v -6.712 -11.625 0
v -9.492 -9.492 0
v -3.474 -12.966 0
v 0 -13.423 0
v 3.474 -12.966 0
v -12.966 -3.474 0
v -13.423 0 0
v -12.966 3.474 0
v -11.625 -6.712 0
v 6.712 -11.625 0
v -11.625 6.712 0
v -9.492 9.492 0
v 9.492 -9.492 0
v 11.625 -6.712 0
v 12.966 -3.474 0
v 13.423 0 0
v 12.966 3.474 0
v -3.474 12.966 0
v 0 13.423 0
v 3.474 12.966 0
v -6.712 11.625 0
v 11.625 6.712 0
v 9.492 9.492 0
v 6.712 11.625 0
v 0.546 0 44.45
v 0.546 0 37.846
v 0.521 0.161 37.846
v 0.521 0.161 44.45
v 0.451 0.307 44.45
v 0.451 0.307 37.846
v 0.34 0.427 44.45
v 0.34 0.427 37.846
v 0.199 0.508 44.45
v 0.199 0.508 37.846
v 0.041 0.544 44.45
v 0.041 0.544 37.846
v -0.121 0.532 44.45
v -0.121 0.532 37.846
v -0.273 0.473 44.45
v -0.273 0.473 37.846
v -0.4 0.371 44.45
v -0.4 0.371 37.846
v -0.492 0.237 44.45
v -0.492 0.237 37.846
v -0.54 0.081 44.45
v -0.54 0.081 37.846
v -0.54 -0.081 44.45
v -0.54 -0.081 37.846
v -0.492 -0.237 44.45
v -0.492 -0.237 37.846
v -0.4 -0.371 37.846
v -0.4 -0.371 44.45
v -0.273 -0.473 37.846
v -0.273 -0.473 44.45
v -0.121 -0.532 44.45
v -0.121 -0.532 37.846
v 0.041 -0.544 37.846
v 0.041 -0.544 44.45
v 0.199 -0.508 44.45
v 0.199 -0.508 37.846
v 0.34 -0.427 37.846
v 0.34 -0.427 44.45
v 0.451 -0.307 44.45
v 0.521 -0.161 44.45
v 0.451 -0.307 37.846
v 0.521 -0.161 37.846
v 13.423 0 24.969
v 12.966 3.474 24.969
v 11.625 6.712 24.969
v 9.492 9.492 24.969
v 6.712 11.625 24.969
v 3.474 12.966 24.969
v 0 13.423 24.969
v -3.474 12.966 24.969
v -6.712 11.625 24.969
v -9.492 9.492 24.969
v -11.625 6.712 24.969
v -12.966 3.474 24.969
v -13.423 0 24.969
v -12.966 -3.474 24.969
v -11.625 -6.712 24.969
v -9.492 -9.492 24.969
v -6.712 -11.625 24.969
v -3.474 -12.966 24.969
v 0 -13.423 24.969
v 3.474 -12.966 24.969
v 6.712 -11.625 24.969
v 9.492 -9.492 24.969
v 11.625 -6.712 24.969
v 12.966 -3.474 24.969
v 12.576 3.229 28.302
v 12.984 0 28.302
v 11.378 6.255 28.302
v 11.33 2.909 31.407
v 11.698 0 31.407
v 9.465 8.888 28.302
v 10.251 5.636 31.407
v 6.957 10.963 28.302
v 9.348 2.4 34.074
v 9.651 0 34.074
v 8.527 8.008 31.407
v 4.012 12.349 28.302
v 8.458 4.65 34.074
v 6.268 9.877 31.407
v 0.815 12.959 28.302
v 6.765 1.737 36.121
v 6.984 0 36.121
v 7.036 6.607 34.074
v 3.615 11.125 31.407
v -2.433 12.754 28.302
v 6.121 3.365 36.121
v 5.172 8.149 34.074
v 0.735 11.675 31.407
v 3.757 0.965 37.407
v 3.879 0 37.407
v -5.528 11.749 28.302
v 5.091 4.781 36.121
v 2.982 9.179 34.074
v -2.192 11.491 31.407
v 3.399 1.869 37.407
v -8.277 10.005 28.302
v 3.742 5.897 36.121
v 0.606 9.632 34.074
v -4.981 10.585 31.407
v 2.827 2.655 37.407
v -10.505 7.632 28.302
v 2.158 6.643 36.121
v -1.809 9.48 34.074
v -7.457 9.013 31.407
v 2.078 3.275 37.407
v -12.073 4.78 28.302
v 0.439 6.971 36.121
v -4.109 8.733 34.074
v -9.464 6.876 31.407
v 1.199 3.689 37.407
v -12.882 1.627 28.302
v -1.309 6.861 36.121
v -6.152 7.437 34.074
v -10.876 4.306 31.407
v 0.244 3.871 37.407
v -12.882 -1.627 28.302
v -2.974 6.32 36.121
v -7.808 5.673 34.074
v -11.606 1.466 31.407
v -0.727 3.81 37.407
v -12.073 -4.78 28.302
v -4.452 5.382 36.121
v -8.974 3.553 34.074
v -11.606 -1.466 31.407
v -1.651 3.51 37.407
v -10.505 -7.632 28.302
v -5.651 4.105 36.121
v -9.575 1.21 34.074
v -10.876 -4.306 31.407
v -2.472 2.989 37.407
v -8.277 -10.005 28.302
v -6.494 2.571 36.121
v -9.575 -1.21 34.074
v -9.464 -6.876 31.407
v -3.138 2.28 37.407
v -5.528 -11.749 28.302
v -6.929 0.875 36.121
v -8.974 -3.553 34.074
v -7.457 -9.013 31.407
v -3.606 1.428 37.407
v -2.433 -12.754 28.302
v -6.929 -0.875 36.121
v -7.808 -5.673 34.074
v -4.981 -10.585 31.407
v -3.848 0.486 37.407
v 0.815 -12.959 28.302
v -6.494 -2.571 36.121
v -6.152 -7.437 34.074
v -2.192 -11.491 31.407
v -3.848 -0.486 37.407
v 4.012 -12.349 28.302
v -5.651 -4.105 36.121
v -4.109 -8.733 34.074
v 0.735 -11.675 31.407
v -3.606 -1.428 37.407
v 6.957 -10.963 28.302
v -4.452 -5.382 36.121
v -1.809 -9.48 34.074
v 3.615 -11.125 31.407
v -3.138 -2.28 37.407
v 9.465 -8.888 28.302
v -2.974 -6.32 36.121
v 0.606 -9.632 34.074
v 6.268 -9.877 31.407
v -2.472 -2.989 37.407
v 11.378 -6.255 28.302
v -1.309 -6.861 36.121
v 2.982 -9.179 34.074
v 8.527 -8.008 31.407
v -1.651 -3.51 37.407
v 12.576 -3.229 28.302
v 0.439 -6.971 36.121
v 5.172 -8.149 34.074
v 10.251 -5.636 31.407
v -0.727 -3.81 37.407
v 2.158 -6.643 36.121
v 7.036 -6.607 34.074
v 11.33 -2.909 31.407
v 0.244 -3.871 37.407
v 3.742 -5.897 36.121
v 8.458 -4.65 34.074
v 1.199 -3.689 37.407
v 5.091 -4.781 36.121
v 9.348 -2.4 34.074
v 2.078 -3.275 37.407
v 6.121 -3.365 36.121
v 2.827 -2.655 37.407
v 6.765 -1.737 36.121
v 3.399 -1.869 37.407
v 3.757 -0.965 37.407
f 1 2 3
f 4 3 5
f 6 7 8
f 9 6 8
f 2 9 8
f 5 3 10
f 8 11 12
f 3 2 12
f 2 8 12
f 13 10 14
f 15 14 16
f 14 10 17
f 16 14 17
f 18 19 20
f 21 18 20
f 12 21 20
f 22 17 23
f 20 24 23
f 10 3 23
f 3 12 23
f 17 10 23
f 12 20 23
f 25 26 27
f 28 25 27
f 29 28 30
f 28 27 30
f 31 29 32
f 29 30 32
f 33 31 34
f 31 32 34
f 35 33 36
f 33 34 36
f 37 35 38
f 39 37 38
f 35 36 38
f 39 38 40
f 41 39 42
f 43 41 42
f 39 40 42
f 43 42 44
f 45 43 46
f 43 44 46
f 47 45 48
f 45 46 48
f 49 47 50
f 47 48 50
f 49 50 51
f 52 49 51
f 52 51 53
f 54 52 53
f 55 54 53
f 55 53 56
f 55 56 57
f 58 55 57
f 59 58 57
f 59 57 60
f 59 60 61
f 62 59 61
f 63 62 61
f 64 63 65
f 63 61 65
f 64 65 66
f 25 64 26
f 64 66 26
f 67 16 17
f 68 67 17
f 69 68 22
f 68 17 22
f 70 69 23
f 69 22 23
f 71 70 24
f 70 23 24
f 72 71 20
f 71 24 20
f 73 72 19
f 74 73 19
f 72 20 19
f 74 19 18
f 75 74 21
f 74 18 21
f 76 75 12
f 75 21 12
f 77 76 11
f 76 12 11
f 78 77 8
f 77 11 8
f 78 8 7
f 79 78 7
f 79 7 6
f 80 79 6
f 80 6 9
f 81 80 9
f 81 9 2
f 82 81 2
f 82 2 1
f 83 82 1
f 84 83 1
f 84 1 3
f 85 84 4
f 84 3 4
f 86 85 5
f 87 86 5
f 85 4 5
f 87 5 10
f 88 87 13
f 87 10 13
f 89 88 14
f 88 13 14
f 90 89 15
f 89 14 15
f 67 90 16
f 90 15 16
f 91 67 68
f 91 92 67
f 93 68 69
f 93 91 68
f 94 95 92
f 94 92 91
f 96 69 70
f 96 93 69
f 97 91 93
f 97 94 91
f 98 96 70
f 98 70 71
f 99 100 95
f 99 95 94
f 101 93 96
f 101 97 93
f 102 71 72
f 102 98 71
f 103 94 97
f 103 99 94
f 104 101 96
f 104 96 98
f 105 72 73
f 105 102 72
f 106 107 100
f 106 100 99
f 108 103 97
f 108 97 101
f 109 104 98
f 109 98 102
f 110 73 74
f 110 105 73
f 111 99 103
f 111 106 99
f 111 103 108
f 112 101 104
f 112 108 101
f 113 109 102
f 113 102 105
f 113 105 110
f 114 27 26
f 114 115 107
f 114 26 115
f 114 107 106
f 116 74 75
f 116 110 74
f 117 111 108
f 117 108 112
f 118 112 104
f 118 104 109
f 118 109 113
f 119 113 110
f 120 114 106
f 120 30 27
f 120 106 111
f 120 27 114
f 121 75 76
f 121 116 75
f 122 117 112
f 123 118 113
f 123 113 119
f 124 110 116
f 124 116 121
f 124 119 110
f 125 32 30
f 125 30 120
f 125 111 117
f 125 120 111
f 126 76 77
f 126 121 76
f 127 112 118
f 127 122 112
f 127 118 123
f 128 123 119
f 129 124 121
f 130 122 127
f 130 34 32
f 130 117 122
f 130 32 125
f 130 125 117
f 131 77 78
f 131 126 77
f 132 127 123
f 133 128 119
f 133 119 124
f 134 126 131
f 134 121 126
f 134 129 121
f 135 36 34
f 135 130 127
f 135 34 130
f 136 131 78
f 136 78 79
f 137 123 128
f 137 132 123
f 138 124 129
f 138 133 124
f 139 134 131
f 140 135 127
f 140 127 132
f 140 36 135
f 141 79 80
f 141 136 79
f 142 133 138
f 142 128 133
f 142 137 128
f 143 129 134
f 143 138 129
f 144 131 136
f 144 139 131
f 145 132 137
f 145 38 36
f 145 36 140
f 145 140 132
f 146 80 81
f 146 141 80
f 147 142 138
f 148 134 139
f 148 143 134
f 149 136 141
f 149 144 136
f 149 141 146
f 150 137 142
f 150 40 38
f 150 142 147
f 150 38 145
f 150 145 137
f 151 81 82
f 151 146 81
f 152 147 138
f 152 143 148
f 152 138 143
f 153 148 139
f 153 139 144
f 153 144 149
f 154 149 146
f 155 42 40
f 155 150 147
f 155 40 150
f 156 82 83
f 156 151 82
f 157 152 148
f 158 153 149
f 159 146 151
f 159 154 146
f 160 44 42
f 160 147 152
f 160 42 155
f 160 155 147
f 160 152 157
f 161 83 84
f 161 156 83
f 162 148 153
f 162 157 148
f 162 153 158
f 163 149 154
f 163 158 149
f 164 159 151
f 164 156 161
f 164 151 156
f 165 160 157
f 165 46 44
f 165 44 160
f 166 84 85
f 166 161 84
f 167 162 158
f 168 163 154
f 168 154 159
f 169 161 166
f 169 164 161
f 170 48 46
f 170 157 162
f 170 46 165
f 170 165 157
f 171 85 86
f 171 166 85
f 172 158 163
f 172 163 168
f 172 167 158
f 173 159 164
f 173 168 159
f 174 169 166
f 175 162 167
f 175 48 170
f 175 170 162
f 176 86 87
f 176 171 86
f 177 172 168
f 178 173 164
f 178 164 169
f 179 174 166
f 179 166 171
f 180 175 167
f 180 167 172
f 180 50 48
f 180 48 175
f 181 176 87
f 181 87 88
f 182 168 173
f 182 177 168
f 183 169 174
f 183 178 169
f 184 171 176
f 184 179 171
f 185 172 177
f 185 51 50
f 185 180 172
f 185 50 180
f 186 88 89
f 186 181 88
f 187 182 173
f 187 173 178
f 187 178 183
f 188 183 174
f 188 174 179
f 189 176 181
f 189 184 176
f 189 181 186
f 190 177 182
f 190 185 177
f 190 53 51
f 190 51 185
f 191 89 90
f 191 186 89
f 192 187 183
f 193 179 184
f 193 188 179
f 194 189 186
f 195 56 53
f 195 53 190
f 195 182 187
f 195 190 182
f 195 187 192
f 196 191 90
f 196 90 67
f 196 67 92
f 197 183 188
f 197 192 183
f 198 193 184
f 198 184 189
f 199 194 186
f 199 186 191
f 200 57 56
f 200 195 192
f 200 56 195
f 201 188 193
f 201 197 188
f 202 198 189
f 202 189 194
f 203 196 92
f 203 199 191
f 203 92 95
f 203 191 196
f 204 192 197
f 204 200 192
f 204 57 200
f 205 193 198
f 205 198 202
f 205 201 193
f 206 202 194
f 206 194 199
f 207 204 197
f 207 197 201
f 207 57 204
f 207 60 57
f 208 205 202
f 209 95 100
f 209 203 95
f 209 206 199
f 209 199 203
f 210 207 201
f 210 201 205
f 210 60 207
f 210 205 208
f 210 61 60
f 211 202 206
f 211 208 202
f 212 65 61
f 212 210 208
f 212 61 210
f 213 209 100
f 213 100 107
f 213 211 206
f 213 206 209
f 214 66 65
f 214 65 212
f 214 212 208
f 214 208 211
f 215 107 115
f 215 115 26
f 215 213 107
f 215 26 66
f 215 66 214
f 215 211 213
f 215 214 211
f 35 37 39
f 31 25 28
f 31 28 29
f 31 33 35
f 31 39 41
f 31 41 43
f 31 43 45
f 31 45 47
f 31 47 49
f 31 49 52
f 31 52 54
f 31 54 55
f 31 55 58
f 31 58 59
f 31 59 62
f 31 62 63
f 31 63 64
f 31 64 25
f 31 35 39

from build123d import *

# Parameters (mm, degrees)
F0_R      = 13.423157
F1_DEPTH  = 37.846
F2_R      = 12.877415
F1_FACE_R = 0.545742
F3_DEPTH  = 6.604


with BuildPart() as f1:
    # F0 (on Top) → F1 (new body)
    with BuildSketch(Plane.XY):
        Circle(F0_R)
    extrude(amount=F1_DEPTH)

    # F2
    f2_edges = [f1.edges().sort_by_distance(p)[0] for p in [
        (-13.423157, 0, 37.846),
    ]]
    fillet(f2_edges, radius=F2_R)

    # F1_face (on face) → F3 (join)
    with BuildSketch(Plane.XY.offset(37.846)):
        Circle(F1_FACE_R)
    extrude(amount=F3_DEPTH)


solid = f1.part
